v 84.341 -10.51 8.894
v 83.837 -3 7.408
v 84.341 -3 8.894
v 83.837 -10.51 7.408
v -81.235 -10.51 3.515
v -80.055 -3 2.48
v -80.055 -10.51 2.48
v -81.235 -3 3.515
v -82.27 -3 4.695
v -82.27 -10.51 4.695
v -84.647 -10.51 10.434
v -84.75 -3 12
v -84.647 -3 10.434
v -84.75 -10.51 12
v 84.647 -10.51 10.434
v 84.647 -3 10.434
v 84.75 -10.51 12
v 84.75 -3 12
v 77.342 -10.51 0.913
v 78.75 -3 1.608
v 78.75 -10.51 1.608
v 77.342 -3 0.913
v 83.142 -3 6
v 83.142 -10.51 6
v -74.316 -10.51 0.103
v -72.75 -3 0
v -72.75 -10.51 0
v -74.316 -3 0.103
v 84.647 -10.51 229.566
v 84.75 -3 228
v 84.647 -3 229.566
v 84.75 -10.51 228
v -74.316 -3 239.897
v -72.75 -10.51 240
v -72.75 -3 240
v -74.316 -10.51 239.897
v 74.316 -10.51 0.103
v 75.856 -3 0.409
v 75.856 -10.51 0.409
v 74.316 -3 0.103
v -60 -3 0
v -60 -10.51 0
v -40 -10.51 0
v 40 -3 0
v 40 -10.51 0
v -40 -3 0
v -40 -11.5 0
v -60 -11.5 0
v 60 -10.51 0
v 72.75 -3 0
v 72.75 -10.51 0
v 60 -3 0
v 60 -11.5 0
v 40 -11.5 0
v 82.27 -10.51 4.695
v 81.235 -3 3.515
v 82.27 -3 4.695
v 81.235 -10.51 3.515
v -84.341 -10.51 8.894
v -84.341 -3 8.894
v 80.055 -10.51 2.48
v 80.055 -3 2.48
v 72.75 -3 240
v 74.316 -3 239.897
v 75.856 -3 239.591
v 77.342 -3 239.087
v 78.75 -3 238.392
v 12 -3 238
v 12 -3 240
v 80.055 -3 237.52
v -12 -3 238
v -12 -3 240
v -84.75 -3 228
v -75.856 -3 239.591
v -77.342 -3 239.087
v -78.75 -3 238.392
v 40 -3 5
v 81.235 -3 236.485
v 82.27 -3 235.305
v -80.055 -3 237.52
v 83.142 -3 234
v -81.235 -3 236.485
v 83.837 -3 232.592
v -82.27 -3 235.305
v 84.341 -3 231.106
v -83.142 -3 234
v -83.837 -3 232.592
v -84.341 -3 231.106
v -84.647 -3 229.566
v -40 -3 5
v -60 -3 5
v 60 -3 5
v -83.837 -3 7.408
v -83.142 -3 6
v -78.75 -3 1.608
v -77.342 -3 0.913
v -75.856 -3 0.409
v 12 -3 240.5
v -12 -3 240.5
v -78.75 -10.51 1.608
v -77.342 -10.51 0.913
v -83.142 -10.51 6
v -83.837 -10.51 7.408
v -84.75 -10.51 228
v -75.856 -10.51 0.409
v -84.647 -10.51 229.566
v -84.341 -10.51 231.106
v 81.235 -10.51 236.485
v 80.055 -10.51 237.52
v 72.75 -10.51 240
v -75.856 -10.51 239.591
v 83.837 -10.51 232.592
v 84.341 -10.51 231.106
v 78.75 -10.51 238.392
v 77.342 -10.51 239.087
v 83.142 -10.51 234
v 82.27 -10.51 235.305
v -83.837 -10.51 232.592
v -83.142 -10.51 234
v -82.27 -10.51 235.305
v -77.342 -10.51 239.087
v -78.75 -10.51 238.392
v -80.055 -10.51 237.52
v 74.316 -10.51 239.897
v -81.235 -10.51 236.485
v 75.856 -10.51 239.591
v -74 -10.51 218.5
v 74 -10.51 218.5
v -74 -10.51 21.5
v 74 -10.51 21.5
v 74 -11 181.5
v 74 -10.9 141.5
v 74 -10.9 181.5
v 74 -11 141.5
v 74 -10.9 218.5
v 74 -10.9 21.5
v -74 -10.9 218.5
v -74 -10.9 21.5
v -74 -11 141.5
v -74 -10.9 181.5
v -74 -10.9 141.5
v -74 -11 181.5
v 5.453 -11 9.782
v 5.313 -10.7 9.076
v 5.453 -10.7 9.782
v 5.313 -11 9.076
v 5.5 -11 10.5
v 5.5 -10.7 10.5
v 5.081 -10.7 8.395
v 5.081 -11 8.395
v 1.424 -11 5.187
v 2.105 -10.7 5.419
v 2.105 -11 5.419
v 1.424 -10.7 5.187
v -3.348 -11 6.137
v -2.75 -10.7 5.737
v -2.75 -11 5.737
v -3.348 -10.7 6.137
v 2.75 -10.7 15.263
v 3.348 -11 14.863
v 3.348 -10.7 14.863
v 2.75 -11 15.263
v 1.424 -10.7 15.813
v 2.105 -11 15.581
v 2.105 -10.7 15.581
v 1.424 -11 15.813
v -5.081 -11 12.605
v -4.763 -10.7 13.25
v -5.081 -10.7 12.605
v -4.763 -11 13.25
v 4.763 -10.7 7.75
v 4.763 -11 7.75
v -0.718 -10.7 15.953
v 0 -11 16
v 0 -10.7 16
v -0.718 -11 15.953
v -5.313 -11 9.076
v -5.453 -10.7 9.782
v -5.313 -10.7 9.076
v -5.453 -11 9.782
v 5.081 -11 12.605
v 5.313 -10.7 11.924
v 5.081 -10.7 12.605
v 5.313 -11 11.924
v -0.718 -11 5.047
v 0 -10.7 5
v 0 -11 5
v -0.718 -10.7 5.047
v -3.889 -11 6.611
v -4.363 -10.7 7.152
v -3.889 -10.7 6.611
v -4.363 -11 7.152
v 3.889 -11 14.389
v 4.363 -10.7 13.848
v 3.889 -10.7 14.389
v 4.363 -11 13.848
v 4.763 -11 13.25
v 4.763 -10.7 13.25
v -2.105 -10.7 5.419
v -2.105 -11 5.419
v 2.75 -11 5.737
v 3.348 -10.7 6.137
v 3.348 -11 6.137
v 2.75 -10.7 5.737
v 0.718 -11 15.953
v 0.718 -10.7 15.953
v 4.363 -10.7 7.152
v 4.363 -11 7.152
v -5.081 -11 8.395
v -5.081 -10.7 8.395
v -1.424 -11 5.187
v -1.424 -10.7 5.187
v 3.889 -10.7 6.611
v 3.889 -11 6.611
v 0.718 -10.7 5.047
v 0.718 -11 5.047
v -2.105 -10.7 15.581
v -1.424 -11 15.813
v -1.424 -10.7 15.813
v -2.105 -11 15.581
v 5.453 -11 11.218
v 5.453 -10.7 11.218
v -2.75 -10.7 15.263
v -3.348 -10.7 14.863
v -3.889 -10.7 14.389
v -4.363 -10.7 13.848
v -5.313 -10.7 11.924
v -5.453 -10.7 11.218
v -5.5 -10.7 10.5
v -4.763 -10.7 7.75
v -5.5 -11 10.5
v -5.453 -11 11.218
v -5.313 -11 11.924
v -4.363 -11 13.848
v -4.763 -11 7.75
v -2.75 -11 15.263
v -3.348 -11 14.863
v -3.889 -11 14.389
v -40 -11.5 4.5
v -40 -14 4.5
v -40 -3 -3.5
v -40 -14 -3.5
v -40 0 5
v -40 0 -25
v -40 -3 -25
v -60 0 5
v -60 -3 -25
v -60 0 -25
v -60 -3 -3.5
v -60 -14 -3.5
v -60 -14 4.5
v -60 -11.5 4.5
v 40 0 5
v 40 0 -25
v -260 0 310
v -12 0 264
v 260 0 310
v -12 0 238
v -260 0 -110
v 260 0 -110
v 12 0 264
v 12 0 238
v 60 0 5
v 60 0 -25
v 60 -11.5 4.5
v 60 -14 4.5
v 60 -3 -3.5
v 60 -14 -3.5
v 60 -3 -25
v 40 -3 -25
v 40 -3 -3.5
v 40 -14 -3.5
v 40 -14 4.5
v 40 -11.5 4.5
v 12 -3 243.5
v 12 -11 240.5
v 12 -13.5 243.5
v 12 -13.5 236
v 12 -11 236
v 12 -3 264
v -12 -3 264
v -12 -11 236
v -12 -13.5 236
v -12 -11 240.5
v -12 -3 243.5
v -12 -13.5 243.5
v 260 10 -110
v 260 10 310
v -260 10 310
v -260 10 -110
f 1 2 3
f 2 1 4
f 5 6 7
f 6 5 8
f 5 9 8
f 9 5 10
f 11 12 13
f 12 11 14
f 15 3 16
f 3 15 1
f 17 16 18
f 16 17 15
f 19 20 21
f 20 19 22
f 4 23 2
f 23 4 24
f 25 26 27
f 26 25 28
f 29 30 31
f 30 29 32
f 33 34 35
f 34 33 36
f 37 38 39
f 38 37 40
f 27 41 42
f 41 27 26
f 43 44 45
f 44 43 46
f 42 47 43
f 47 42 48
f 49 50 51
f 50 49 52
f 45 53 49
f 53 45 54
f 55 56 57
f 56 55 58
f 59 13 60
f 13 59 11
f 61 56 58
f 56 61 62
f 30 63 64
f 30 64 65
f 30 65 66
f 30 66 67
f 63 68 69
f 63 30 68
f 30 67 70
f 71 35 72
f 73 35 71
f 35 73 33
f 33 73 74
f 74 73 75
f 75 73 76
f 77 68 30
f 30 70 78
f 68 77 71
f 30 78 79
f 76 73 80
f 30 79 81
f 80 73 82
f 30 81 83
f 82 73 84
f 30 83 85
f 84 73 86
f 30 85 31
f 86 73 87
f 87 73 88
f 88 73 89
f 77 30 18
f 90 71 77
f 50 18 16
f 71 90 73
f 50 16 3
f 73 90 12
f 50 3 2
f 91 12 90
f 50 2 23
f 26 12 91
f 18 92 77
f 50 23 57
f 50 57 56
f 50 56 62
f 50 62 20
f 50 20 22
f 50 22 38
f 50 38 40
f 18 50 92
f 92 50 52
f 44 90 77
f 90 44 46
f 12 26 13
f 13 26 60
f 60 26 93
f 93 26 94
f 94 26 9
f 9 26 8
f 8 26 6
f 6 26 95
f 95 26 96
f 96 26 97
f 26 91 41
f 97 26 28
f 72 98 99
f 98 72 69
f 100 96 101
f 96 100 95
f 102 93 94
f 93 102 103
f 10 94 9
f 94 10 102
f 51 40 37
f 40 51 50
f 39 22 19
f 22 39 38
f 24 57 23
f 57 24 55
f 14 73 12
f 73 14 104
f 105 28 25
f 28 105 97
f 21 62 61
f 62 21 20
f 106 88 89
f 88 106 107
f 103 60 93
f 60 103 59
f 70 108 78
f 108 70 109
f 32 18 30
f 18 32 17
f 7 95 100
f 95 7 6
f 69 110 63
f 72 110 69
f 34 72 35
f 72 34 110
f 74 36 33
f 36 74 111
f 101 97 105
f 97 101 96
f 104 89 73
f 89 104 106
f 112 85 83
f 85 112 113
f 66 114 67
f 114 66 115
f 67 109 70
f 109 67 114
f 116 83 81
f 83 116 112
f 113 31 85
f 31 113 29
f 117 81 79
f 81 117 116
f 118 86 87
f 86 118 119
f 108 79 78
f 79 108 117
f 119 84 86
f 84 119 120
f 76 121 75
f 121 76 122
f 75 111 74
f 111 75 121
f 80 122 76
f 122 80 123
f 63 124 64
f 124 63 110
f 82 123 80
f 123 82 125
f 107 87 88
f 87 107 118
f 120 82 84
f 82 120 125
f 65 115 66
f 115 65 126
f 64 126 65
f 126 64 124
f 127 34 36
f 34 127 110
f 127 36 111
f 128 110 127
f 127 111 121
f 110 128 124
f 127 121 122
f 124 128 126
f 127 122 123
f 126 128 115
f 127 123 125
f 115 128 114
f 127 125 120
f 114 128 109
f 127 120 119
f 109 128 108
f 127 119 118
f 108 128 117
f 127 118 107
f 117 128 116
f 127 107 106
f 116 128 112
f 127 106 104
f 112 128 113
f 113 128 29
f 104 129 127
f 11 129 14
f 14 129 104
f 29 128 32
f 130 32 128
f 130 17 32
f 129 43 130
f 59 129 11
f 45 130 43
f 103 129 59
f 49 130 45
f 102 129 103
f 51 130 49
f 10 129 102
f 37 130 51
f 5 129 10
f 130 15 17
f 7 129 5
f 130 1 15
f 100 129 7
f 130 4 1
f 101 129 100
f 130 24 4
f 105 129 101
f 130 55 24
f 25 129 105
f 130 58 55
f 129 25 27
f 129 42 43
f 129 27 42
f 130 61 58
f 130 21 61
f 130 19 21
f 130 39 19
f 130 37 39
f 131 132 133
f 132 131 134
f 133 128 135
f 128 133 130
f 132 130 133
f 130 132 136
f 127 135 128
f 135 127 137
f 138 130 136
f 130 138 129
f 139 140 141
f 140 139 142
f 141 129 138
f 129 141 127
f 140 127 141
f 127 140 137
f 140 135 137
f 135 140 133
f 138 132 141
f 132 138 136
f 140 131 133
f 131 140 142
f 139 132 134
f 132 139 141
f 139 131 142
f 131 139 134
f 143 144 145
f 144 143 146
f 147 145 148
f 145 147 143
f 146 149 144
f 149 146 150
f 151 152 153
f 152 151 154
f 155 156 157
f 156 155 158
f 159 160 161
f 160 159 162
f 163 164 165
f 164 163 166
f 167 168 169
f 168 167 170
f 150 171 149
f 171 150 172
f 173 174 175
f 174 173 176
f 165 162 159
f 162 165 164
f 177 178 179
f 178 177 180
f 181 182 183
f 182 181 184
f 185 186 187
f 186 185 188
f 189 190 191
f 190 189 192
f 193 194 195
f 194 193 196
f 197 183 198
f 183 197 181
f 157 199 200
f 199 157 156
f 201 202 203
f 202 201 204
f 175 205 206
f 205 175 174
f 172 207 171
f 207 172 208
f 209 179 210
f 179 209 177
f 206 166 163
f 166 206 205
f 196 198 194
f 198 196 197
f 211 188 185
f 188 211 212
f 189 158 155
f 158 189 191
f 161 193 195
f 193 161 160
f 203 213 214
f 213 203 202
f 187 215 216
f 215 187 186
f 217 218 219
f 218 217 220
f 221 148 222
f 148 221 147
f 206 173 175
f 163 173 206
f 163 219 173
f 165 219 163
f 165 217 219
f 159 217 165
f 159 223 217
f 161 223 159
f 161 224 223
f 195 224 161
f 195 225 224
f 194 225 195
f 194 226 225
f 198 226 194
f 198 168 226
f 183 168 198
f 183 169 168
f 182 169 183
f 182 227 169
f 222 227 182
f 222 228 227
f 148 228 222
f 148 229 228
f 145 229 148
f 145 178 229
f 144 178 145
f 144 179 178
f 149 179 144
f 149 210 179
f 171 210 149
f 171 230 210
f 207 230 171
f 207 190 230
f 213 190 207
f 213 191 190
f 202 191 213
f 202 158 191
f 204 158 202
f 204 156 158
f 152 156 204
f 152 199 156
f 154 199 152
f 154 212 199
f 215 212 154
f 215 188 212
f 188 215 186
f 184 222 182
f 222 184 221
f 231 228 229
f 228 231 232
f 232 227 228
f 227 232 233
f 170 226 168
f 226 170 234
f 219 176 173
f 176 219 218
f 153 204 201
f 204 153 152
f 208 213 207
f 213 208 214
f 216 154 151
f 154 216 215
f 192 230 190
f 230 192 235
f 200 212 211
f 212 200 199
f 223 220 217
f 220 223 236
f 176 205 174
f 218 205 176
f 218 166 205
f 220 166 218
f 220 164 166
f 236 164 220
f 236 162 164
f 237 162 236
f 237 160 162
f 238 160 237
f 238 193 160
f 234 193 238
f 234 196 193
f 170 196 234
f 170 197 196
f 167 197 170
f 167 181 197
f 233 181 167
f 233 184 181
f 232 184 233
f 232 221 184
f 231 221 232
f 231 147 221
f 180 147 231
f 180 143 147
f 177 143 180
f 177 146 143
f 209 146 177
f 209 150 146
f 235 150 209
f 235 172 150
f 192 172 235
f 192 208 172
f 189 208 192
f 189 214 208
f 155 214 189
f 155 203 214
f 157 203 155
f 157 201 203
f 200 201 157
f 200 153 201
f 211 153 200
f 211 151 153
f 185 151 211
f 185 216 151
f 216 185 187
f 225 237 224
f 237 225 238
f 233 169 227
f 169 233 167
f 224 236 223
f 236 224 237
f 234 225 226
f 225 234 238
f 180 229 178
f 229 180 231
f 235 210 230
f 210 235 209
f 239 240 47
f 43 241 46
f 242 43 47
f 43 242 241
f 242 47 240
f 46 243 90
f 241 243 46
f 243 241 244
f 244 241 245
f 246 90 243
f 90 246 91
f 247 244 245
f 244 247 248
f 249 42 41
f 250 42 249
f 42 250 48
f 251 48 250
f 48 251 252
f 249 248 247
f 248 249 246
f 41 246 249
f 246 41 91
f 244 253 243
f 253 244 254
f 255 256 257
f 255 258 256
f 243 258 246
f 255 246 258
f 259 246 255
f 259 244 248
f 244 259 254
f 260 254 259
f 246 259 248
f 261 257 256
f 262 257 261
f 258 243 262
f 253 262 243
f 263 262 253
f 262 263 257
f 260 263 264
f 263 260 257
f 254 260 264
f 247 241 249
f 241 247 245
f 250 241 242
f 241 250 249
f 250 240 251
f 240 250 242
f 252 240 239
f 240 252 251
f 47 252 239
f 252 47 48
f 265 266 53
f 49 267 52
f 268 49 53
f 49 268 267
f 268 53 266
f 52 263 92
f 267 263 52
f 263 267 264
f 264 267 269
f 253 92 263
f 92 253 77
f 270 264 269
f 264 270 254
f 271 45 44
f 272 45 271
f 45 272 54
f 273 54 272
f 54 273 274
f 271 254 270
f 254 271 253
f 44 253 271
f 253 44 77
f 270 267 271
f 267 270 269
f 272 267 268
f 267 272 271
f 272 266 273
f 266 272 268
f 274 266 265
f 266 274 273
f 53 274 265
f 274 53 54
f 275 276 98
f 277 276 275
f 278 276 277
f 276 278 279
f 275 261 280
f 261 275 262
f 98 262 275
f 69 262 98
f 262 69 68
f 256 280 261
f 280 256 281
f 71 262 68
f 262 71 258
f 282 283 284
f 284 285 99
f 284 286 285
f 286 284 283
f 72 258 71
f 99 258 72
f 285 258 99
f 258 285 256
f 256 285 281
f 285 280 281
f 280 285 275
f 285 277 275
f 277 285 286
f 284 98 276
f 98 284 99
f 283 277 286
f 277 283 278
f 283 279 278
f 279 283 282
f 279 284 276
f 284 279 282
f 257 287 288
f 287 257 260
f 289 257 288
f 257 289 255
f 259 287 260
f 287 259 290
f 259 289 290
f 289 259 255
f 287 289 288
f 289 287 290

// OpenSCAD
// Visuels de principe — supports muraux iPad 5e gén. (240 x 169.5 x 7.5 mm)
design = 1;
W = 169.5; H = 240; T = 7.5; R = 12;
mur = [520, 10, 420];
noir = [0.12,0.12,0.13];
$fn = 48;

module rrect(w,h,t,r){ hull() for(x=[r,w-r],z=[r,h-r]) translate([x,0,z]) rotate([-90,0,0]) cylinder(r=r,h=t); }

// iPad posé à `dy` du mur, face avant vers -y
module ipad(dy=0){
  translate([-W/2, -dy - T, 0]) {
    color([0.85,0.86,0.88]) rrect(W,H,T,R);                       // coque alu + face blanche
    color([0.93,0.93,0.94]) translate([0,-0.01,0]) rrect(W,H,0.3,R);
    color([0.05,0.07,0.12]) translate([(W-148)/2,-0.4,(H-197)/2]) cube([148,0.4,197]); // écran
    color([0.25,0.5,0.85]) translate([(W-148)/2,-0.5,(H-197)/2+120]) cube([148,0.2,40]); // fond d'écran
    color([0.8,0.8,0.82]) translate([W/2,-0.5,10.5]) rotate([-90,0,0]) cylinder(d=11,h=0.3); // bouton home
  }
}
module mur_(){ color([0.95,0.94,0.91]) translate([-mur[0]/2, 0, -110]) cube(mur); }
module cable(){ color([0.97,0.97,0.97]) translate([0,-5,-4]) { rotate([0,0,0]) cylinder(d=4,h=4); translate([0,0,-120]) cylinder(d=3.5,h=116);} }

module crochet(){ // L vu de profil : dos + semelle + lèvre avant
  color(noir) translate([-10,0,0]) { translate([0,-3,-25]) cube([20,3,30]); translate([0,-T-6.5,-3.5]) cube([20,T+6.5,3.5]); translate([0,-T-6.5,-3.5]) cube([20,2.5,8]); }
}
module clip_haut(){
  color(noir) translate([-12,0,H]) { translate([0,-3,-2]) cube([24,3,26]); translate([0,-T-6,0.5]) cube([24,T+6,3]); translate([0,-T-6,-4]) cube([24,2.5,7.5]); }
}

if (design==1){ mur_(); ipad(3); translate([-50,0,0]) crochet(); translate([50,0,0]) crochet(); clip_haut(); }
if (design==2){ mur_(); ipad(3);
  color(noir) translate([-W/2-5,-3-T-2,-5]) difference(){
    cube([W+10, T+5, H+5]);
    translate([5,-1,5]) cube([W, T+2+0.01, H+10]);   // logement (ouvert en haut)
  }
  // lèvre avant fine
  color(noir) difference(){
    translate([-W/2-5,-3-T-2,-5]) cube([W+10,2,H+5]);
    translate([-W/2+3,-3-T-3,3]) cube([W-6,4,H]);
    translate([-12,-3-T-3,-6]) cube([24,4,10]);       // passage bouton home / câble
  }
}
if (design==3){ mur_(); ipad(3);
  color(noir) translate([-W/2-25,-38,-12]) { cube([W+50,38,12]); translate([0,0,0]) cube([W+50,3,22]); }
  clip_haut();
  color([0.3,0.3,0.3]) translate([60,-25,0]) cube([30,14,6]);  // clés posées dans le vide-poche
}
if (design==4){ mur_();
  color(noir) translate([-70,-4,20]) rrect(140,200,4,10);       // plaque murale
  for(x=[-50,50],z=[50,190]) color([0.75,0.75,0.78]) translate([x,-4.2,z]) rotate([90,0,0]) cylinder(d=12,h=0.6);
  translate([0,-30,0]) { color(noir) translate([-W/2-1.5,-3,-1.5]) rrect(W+3,H+3,3,R); ipad(3); } // coque + iPad, décollés
}
